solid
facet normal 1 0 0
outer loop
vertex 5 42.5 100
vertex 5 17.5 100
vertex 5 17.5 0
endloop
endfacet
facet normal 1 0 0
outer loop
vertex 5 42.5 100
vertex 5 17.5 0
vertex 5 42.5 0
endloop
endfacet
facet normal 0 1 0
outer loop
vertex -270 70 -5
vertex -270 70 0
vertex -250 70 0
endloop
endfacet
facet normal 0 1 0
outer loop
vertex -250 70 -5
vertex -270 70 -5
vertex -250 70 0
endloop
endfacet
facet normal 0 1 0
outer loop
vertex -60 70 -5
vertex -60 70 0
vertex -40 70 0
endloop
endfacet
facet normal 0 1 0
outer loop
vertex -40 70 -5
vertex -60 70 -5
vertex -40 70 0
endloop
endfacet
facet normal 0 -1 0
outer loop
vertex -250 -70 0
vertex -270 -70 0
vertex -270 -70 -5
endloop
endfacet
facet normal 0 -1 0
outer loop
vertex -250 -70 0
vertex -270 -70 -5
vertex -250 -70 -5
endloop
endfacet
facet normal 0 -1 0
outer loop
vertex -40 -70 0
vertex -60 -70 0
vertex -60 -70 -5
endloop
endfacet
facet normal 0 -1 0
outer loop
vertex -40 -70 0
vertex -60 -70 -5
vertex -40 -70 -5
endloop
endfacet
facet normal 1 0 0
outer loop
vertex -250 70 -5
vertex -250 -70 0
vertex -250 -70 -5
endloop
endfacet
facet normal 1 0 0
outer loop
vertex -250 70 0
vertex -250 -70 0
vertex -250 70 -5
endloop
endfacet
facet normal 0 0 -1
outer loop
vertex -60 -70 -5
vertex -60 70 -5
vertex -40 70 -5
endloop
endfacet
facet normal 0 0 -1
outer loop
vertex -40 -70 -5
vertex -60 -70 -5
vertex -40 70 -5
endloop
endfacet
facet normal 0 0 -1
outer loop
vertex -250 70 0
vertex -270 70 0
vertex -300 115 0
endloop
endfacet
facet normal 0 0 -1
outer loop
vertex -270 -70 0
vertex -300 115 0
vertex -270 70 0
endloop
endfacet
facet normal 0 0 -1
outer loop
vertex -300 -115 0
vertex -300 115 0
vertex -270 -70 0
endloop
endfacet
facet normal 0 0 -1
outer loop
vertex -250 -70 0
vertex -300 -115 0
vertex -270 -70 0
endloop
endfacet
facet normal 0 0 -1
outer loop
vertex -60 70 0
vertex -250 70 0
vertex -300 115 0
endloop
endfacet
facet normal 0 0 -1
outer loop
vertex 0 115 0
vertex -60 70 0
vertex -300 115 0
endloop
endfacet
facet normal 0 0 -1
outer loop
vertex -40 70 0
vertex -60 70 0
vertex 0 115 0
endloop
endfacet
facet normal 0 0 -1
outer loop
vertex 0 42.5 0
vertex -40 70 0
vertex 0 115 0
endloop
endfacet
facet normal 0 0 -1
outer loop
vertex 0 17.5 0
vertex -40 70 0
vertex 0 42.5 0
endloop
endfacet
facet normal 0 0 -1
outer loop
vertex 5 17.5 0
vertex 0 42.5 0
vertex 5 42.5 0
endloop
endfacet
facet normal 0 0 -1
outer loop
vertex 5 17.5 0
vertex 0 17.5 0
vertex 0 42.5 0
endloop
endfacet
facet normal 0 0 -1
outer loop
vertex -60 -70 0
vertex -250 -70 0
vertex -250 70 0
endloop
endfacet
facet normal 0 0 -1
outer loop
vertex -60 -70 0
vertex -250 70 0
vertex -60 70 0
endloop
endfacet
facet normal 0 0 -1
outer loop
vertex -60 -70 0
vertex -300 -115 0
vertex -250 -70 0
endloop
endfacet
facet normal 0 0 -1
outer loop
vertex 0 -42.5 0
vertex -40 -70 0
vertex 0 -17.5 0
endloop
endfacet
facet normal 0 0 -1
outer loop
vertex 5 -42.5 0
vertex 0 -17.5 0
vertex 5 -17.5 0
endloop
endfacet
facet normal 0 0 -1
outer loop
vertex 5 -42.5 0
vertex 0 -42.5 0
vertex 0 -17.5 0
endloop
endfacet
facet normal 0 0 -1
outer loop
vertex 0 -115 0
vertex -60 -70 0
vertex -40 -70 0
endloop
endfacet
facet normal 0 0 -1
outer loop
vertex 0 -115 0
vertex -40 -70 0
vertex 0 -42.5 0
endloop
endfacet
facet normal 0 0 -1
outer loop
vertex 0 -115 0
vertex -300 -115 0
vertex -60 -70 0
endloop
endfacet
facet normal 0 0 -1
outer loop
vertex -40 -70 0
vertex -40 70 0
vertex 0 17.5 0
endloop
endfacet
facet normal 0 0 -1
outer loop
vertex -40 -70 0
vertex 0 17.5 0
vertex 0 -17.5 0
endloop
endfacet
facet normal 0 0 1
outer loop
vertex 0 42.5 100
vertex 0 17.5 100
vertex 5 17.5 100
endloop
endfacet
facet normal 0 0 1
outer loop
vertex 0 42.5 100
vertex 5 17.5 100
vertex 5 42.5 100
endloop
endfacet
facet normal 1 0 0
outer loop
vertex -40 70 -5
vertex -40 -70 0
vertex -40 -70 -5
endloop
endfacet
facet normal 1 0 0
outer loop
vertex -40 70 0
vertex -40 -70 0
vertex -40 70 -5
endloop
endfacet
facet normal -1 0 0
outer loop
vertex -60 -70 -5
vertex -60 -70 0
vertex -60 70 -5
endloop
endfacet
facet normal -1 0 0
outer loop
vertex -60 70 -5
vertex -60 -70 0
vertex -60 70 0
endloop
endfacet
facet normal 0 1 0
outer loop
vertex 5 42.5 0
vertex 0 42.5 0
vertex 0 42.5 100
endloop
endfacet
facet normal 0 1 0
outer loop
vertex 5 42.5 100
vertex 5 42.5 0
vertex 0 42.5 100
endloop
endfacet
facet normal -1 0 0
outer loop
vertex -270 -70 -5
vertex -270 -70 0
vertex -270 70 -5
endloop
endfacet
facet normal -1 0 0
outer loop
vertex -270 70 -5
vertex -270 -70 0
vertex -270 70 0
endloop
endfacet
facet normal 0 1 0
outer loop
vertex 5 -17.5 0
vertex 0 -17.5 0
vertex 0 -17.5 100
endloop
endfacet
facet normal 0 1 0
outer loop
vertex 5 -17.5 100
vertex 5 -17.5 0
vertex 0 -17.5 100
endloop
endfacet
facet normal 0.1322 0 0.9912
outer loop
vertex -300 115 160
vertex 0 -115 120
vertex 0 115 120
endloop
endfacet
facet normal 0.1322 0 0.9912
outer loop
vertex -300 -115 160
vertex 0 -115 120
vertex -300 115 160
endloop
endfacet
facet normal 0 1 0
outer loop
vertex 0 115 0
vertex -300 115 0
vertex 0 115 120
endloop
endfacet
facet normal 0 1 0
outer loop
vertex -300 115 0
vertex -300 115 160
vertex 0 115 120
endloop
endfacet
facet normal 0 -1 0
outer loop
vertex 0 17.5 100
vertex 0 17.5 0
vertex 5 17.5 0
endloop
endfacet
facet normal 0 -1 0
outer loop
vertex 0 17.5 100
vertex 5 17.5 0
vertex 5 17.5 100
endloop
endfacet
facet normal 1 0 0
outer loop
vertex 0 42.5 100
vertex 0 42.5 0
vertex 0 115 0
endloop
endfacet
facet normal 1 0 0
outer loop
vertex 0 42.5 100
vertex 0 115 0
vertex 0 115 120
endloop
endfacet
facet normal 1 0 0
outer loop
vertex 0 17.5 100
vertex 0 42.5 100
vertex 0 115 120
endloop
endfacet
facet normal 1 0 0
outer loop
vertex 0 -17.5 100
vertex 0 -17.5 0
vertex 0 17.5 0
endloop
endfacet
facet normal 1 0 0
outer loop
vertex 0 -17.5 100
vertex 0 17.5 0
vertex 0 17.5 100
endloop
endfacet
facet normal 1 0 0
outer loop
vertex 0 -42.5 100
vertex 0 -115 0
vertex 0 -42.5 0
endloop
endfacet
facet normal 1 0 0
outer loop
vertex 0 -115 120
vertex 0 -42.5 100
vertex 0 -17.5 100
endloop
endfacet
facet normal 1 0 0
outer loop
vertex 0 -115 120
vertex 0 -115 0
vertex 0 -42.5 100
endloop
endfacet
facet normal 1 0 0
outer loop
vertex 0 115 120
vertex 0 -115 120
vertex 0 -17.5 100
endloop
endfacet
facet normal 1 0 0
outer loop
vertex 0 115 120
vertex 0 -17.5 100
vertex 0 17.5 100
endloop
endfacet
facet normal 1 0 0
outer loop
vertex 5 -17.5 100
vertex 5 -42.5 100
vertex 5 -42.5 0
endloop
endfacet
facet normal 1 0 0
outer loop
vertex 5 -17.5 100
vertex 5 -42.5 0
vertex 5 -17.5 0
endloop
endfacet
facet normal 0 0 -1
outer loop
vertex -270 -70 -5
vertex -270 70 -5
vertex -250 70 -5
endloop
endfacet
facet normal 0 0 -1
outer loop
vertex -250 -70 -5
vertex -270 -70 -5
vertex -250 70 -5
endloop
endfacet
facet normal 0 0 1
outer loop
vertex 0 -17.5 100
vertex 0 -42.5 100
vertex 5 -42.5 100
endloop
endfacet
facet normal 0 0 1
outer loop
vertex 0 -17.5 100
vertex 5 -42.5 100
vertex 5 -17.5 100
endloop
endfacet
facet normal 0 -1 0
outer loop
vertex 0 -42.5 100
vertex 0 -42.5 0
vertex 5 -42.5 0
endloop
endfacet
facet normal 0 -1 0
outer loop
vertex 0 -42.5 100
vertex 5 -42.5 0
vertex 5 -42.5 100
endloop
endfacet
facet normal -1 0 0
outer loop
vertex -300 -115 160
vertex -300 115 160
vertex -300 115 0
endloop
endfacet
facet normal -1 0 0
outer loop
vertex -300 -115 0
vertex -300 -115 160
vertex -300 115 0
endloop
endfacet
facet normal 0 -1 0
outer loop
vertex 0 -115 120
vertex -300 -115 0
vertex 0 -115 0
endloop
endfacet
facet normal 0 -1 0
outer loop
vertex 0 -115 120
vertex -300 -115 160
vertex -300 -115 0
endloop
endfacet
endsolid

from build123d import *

# Parameters (mm, degrees)
F1_DEPTH = 115
F2_W     = 20
F2_H     = 140
F3_DEPTH = 5
F4_W     = 25
F4_H     = 100
F5_DEPTH = 5


with BuildPart() as f1:
    # F0 (on Front) → F1 (new body, symmetric)
    with BuildSketch(Plane.XZ):
        Polygon((-300, 0), (0, 0), (0, 120), (-300, 160), align=None)
    extrude(amount=F1_DEPTH, both=True)

    # F2 (on Top) → F3 (join)
    with BuildSketch(Plane.XY):
        with Locations((-260, 0)):
            Rectangle(F2_W, F2_H)
        with Locations((-50, 0)):
            Rectangle(F2_W, F2_H)
    extrude(amount=-F3_DEPTH)

    # F4 (on Right) → F5 (join)
    with BuildSketch(Plane.YZ):
        with Locations((30, 50)):
            Rectangle(F4_W, F4_H)
        with Locations((-30, 50)):
            Rectangle(F4_W, F4_H)
    extrude(amount=F5_DEPTH)


solid = f1.part
